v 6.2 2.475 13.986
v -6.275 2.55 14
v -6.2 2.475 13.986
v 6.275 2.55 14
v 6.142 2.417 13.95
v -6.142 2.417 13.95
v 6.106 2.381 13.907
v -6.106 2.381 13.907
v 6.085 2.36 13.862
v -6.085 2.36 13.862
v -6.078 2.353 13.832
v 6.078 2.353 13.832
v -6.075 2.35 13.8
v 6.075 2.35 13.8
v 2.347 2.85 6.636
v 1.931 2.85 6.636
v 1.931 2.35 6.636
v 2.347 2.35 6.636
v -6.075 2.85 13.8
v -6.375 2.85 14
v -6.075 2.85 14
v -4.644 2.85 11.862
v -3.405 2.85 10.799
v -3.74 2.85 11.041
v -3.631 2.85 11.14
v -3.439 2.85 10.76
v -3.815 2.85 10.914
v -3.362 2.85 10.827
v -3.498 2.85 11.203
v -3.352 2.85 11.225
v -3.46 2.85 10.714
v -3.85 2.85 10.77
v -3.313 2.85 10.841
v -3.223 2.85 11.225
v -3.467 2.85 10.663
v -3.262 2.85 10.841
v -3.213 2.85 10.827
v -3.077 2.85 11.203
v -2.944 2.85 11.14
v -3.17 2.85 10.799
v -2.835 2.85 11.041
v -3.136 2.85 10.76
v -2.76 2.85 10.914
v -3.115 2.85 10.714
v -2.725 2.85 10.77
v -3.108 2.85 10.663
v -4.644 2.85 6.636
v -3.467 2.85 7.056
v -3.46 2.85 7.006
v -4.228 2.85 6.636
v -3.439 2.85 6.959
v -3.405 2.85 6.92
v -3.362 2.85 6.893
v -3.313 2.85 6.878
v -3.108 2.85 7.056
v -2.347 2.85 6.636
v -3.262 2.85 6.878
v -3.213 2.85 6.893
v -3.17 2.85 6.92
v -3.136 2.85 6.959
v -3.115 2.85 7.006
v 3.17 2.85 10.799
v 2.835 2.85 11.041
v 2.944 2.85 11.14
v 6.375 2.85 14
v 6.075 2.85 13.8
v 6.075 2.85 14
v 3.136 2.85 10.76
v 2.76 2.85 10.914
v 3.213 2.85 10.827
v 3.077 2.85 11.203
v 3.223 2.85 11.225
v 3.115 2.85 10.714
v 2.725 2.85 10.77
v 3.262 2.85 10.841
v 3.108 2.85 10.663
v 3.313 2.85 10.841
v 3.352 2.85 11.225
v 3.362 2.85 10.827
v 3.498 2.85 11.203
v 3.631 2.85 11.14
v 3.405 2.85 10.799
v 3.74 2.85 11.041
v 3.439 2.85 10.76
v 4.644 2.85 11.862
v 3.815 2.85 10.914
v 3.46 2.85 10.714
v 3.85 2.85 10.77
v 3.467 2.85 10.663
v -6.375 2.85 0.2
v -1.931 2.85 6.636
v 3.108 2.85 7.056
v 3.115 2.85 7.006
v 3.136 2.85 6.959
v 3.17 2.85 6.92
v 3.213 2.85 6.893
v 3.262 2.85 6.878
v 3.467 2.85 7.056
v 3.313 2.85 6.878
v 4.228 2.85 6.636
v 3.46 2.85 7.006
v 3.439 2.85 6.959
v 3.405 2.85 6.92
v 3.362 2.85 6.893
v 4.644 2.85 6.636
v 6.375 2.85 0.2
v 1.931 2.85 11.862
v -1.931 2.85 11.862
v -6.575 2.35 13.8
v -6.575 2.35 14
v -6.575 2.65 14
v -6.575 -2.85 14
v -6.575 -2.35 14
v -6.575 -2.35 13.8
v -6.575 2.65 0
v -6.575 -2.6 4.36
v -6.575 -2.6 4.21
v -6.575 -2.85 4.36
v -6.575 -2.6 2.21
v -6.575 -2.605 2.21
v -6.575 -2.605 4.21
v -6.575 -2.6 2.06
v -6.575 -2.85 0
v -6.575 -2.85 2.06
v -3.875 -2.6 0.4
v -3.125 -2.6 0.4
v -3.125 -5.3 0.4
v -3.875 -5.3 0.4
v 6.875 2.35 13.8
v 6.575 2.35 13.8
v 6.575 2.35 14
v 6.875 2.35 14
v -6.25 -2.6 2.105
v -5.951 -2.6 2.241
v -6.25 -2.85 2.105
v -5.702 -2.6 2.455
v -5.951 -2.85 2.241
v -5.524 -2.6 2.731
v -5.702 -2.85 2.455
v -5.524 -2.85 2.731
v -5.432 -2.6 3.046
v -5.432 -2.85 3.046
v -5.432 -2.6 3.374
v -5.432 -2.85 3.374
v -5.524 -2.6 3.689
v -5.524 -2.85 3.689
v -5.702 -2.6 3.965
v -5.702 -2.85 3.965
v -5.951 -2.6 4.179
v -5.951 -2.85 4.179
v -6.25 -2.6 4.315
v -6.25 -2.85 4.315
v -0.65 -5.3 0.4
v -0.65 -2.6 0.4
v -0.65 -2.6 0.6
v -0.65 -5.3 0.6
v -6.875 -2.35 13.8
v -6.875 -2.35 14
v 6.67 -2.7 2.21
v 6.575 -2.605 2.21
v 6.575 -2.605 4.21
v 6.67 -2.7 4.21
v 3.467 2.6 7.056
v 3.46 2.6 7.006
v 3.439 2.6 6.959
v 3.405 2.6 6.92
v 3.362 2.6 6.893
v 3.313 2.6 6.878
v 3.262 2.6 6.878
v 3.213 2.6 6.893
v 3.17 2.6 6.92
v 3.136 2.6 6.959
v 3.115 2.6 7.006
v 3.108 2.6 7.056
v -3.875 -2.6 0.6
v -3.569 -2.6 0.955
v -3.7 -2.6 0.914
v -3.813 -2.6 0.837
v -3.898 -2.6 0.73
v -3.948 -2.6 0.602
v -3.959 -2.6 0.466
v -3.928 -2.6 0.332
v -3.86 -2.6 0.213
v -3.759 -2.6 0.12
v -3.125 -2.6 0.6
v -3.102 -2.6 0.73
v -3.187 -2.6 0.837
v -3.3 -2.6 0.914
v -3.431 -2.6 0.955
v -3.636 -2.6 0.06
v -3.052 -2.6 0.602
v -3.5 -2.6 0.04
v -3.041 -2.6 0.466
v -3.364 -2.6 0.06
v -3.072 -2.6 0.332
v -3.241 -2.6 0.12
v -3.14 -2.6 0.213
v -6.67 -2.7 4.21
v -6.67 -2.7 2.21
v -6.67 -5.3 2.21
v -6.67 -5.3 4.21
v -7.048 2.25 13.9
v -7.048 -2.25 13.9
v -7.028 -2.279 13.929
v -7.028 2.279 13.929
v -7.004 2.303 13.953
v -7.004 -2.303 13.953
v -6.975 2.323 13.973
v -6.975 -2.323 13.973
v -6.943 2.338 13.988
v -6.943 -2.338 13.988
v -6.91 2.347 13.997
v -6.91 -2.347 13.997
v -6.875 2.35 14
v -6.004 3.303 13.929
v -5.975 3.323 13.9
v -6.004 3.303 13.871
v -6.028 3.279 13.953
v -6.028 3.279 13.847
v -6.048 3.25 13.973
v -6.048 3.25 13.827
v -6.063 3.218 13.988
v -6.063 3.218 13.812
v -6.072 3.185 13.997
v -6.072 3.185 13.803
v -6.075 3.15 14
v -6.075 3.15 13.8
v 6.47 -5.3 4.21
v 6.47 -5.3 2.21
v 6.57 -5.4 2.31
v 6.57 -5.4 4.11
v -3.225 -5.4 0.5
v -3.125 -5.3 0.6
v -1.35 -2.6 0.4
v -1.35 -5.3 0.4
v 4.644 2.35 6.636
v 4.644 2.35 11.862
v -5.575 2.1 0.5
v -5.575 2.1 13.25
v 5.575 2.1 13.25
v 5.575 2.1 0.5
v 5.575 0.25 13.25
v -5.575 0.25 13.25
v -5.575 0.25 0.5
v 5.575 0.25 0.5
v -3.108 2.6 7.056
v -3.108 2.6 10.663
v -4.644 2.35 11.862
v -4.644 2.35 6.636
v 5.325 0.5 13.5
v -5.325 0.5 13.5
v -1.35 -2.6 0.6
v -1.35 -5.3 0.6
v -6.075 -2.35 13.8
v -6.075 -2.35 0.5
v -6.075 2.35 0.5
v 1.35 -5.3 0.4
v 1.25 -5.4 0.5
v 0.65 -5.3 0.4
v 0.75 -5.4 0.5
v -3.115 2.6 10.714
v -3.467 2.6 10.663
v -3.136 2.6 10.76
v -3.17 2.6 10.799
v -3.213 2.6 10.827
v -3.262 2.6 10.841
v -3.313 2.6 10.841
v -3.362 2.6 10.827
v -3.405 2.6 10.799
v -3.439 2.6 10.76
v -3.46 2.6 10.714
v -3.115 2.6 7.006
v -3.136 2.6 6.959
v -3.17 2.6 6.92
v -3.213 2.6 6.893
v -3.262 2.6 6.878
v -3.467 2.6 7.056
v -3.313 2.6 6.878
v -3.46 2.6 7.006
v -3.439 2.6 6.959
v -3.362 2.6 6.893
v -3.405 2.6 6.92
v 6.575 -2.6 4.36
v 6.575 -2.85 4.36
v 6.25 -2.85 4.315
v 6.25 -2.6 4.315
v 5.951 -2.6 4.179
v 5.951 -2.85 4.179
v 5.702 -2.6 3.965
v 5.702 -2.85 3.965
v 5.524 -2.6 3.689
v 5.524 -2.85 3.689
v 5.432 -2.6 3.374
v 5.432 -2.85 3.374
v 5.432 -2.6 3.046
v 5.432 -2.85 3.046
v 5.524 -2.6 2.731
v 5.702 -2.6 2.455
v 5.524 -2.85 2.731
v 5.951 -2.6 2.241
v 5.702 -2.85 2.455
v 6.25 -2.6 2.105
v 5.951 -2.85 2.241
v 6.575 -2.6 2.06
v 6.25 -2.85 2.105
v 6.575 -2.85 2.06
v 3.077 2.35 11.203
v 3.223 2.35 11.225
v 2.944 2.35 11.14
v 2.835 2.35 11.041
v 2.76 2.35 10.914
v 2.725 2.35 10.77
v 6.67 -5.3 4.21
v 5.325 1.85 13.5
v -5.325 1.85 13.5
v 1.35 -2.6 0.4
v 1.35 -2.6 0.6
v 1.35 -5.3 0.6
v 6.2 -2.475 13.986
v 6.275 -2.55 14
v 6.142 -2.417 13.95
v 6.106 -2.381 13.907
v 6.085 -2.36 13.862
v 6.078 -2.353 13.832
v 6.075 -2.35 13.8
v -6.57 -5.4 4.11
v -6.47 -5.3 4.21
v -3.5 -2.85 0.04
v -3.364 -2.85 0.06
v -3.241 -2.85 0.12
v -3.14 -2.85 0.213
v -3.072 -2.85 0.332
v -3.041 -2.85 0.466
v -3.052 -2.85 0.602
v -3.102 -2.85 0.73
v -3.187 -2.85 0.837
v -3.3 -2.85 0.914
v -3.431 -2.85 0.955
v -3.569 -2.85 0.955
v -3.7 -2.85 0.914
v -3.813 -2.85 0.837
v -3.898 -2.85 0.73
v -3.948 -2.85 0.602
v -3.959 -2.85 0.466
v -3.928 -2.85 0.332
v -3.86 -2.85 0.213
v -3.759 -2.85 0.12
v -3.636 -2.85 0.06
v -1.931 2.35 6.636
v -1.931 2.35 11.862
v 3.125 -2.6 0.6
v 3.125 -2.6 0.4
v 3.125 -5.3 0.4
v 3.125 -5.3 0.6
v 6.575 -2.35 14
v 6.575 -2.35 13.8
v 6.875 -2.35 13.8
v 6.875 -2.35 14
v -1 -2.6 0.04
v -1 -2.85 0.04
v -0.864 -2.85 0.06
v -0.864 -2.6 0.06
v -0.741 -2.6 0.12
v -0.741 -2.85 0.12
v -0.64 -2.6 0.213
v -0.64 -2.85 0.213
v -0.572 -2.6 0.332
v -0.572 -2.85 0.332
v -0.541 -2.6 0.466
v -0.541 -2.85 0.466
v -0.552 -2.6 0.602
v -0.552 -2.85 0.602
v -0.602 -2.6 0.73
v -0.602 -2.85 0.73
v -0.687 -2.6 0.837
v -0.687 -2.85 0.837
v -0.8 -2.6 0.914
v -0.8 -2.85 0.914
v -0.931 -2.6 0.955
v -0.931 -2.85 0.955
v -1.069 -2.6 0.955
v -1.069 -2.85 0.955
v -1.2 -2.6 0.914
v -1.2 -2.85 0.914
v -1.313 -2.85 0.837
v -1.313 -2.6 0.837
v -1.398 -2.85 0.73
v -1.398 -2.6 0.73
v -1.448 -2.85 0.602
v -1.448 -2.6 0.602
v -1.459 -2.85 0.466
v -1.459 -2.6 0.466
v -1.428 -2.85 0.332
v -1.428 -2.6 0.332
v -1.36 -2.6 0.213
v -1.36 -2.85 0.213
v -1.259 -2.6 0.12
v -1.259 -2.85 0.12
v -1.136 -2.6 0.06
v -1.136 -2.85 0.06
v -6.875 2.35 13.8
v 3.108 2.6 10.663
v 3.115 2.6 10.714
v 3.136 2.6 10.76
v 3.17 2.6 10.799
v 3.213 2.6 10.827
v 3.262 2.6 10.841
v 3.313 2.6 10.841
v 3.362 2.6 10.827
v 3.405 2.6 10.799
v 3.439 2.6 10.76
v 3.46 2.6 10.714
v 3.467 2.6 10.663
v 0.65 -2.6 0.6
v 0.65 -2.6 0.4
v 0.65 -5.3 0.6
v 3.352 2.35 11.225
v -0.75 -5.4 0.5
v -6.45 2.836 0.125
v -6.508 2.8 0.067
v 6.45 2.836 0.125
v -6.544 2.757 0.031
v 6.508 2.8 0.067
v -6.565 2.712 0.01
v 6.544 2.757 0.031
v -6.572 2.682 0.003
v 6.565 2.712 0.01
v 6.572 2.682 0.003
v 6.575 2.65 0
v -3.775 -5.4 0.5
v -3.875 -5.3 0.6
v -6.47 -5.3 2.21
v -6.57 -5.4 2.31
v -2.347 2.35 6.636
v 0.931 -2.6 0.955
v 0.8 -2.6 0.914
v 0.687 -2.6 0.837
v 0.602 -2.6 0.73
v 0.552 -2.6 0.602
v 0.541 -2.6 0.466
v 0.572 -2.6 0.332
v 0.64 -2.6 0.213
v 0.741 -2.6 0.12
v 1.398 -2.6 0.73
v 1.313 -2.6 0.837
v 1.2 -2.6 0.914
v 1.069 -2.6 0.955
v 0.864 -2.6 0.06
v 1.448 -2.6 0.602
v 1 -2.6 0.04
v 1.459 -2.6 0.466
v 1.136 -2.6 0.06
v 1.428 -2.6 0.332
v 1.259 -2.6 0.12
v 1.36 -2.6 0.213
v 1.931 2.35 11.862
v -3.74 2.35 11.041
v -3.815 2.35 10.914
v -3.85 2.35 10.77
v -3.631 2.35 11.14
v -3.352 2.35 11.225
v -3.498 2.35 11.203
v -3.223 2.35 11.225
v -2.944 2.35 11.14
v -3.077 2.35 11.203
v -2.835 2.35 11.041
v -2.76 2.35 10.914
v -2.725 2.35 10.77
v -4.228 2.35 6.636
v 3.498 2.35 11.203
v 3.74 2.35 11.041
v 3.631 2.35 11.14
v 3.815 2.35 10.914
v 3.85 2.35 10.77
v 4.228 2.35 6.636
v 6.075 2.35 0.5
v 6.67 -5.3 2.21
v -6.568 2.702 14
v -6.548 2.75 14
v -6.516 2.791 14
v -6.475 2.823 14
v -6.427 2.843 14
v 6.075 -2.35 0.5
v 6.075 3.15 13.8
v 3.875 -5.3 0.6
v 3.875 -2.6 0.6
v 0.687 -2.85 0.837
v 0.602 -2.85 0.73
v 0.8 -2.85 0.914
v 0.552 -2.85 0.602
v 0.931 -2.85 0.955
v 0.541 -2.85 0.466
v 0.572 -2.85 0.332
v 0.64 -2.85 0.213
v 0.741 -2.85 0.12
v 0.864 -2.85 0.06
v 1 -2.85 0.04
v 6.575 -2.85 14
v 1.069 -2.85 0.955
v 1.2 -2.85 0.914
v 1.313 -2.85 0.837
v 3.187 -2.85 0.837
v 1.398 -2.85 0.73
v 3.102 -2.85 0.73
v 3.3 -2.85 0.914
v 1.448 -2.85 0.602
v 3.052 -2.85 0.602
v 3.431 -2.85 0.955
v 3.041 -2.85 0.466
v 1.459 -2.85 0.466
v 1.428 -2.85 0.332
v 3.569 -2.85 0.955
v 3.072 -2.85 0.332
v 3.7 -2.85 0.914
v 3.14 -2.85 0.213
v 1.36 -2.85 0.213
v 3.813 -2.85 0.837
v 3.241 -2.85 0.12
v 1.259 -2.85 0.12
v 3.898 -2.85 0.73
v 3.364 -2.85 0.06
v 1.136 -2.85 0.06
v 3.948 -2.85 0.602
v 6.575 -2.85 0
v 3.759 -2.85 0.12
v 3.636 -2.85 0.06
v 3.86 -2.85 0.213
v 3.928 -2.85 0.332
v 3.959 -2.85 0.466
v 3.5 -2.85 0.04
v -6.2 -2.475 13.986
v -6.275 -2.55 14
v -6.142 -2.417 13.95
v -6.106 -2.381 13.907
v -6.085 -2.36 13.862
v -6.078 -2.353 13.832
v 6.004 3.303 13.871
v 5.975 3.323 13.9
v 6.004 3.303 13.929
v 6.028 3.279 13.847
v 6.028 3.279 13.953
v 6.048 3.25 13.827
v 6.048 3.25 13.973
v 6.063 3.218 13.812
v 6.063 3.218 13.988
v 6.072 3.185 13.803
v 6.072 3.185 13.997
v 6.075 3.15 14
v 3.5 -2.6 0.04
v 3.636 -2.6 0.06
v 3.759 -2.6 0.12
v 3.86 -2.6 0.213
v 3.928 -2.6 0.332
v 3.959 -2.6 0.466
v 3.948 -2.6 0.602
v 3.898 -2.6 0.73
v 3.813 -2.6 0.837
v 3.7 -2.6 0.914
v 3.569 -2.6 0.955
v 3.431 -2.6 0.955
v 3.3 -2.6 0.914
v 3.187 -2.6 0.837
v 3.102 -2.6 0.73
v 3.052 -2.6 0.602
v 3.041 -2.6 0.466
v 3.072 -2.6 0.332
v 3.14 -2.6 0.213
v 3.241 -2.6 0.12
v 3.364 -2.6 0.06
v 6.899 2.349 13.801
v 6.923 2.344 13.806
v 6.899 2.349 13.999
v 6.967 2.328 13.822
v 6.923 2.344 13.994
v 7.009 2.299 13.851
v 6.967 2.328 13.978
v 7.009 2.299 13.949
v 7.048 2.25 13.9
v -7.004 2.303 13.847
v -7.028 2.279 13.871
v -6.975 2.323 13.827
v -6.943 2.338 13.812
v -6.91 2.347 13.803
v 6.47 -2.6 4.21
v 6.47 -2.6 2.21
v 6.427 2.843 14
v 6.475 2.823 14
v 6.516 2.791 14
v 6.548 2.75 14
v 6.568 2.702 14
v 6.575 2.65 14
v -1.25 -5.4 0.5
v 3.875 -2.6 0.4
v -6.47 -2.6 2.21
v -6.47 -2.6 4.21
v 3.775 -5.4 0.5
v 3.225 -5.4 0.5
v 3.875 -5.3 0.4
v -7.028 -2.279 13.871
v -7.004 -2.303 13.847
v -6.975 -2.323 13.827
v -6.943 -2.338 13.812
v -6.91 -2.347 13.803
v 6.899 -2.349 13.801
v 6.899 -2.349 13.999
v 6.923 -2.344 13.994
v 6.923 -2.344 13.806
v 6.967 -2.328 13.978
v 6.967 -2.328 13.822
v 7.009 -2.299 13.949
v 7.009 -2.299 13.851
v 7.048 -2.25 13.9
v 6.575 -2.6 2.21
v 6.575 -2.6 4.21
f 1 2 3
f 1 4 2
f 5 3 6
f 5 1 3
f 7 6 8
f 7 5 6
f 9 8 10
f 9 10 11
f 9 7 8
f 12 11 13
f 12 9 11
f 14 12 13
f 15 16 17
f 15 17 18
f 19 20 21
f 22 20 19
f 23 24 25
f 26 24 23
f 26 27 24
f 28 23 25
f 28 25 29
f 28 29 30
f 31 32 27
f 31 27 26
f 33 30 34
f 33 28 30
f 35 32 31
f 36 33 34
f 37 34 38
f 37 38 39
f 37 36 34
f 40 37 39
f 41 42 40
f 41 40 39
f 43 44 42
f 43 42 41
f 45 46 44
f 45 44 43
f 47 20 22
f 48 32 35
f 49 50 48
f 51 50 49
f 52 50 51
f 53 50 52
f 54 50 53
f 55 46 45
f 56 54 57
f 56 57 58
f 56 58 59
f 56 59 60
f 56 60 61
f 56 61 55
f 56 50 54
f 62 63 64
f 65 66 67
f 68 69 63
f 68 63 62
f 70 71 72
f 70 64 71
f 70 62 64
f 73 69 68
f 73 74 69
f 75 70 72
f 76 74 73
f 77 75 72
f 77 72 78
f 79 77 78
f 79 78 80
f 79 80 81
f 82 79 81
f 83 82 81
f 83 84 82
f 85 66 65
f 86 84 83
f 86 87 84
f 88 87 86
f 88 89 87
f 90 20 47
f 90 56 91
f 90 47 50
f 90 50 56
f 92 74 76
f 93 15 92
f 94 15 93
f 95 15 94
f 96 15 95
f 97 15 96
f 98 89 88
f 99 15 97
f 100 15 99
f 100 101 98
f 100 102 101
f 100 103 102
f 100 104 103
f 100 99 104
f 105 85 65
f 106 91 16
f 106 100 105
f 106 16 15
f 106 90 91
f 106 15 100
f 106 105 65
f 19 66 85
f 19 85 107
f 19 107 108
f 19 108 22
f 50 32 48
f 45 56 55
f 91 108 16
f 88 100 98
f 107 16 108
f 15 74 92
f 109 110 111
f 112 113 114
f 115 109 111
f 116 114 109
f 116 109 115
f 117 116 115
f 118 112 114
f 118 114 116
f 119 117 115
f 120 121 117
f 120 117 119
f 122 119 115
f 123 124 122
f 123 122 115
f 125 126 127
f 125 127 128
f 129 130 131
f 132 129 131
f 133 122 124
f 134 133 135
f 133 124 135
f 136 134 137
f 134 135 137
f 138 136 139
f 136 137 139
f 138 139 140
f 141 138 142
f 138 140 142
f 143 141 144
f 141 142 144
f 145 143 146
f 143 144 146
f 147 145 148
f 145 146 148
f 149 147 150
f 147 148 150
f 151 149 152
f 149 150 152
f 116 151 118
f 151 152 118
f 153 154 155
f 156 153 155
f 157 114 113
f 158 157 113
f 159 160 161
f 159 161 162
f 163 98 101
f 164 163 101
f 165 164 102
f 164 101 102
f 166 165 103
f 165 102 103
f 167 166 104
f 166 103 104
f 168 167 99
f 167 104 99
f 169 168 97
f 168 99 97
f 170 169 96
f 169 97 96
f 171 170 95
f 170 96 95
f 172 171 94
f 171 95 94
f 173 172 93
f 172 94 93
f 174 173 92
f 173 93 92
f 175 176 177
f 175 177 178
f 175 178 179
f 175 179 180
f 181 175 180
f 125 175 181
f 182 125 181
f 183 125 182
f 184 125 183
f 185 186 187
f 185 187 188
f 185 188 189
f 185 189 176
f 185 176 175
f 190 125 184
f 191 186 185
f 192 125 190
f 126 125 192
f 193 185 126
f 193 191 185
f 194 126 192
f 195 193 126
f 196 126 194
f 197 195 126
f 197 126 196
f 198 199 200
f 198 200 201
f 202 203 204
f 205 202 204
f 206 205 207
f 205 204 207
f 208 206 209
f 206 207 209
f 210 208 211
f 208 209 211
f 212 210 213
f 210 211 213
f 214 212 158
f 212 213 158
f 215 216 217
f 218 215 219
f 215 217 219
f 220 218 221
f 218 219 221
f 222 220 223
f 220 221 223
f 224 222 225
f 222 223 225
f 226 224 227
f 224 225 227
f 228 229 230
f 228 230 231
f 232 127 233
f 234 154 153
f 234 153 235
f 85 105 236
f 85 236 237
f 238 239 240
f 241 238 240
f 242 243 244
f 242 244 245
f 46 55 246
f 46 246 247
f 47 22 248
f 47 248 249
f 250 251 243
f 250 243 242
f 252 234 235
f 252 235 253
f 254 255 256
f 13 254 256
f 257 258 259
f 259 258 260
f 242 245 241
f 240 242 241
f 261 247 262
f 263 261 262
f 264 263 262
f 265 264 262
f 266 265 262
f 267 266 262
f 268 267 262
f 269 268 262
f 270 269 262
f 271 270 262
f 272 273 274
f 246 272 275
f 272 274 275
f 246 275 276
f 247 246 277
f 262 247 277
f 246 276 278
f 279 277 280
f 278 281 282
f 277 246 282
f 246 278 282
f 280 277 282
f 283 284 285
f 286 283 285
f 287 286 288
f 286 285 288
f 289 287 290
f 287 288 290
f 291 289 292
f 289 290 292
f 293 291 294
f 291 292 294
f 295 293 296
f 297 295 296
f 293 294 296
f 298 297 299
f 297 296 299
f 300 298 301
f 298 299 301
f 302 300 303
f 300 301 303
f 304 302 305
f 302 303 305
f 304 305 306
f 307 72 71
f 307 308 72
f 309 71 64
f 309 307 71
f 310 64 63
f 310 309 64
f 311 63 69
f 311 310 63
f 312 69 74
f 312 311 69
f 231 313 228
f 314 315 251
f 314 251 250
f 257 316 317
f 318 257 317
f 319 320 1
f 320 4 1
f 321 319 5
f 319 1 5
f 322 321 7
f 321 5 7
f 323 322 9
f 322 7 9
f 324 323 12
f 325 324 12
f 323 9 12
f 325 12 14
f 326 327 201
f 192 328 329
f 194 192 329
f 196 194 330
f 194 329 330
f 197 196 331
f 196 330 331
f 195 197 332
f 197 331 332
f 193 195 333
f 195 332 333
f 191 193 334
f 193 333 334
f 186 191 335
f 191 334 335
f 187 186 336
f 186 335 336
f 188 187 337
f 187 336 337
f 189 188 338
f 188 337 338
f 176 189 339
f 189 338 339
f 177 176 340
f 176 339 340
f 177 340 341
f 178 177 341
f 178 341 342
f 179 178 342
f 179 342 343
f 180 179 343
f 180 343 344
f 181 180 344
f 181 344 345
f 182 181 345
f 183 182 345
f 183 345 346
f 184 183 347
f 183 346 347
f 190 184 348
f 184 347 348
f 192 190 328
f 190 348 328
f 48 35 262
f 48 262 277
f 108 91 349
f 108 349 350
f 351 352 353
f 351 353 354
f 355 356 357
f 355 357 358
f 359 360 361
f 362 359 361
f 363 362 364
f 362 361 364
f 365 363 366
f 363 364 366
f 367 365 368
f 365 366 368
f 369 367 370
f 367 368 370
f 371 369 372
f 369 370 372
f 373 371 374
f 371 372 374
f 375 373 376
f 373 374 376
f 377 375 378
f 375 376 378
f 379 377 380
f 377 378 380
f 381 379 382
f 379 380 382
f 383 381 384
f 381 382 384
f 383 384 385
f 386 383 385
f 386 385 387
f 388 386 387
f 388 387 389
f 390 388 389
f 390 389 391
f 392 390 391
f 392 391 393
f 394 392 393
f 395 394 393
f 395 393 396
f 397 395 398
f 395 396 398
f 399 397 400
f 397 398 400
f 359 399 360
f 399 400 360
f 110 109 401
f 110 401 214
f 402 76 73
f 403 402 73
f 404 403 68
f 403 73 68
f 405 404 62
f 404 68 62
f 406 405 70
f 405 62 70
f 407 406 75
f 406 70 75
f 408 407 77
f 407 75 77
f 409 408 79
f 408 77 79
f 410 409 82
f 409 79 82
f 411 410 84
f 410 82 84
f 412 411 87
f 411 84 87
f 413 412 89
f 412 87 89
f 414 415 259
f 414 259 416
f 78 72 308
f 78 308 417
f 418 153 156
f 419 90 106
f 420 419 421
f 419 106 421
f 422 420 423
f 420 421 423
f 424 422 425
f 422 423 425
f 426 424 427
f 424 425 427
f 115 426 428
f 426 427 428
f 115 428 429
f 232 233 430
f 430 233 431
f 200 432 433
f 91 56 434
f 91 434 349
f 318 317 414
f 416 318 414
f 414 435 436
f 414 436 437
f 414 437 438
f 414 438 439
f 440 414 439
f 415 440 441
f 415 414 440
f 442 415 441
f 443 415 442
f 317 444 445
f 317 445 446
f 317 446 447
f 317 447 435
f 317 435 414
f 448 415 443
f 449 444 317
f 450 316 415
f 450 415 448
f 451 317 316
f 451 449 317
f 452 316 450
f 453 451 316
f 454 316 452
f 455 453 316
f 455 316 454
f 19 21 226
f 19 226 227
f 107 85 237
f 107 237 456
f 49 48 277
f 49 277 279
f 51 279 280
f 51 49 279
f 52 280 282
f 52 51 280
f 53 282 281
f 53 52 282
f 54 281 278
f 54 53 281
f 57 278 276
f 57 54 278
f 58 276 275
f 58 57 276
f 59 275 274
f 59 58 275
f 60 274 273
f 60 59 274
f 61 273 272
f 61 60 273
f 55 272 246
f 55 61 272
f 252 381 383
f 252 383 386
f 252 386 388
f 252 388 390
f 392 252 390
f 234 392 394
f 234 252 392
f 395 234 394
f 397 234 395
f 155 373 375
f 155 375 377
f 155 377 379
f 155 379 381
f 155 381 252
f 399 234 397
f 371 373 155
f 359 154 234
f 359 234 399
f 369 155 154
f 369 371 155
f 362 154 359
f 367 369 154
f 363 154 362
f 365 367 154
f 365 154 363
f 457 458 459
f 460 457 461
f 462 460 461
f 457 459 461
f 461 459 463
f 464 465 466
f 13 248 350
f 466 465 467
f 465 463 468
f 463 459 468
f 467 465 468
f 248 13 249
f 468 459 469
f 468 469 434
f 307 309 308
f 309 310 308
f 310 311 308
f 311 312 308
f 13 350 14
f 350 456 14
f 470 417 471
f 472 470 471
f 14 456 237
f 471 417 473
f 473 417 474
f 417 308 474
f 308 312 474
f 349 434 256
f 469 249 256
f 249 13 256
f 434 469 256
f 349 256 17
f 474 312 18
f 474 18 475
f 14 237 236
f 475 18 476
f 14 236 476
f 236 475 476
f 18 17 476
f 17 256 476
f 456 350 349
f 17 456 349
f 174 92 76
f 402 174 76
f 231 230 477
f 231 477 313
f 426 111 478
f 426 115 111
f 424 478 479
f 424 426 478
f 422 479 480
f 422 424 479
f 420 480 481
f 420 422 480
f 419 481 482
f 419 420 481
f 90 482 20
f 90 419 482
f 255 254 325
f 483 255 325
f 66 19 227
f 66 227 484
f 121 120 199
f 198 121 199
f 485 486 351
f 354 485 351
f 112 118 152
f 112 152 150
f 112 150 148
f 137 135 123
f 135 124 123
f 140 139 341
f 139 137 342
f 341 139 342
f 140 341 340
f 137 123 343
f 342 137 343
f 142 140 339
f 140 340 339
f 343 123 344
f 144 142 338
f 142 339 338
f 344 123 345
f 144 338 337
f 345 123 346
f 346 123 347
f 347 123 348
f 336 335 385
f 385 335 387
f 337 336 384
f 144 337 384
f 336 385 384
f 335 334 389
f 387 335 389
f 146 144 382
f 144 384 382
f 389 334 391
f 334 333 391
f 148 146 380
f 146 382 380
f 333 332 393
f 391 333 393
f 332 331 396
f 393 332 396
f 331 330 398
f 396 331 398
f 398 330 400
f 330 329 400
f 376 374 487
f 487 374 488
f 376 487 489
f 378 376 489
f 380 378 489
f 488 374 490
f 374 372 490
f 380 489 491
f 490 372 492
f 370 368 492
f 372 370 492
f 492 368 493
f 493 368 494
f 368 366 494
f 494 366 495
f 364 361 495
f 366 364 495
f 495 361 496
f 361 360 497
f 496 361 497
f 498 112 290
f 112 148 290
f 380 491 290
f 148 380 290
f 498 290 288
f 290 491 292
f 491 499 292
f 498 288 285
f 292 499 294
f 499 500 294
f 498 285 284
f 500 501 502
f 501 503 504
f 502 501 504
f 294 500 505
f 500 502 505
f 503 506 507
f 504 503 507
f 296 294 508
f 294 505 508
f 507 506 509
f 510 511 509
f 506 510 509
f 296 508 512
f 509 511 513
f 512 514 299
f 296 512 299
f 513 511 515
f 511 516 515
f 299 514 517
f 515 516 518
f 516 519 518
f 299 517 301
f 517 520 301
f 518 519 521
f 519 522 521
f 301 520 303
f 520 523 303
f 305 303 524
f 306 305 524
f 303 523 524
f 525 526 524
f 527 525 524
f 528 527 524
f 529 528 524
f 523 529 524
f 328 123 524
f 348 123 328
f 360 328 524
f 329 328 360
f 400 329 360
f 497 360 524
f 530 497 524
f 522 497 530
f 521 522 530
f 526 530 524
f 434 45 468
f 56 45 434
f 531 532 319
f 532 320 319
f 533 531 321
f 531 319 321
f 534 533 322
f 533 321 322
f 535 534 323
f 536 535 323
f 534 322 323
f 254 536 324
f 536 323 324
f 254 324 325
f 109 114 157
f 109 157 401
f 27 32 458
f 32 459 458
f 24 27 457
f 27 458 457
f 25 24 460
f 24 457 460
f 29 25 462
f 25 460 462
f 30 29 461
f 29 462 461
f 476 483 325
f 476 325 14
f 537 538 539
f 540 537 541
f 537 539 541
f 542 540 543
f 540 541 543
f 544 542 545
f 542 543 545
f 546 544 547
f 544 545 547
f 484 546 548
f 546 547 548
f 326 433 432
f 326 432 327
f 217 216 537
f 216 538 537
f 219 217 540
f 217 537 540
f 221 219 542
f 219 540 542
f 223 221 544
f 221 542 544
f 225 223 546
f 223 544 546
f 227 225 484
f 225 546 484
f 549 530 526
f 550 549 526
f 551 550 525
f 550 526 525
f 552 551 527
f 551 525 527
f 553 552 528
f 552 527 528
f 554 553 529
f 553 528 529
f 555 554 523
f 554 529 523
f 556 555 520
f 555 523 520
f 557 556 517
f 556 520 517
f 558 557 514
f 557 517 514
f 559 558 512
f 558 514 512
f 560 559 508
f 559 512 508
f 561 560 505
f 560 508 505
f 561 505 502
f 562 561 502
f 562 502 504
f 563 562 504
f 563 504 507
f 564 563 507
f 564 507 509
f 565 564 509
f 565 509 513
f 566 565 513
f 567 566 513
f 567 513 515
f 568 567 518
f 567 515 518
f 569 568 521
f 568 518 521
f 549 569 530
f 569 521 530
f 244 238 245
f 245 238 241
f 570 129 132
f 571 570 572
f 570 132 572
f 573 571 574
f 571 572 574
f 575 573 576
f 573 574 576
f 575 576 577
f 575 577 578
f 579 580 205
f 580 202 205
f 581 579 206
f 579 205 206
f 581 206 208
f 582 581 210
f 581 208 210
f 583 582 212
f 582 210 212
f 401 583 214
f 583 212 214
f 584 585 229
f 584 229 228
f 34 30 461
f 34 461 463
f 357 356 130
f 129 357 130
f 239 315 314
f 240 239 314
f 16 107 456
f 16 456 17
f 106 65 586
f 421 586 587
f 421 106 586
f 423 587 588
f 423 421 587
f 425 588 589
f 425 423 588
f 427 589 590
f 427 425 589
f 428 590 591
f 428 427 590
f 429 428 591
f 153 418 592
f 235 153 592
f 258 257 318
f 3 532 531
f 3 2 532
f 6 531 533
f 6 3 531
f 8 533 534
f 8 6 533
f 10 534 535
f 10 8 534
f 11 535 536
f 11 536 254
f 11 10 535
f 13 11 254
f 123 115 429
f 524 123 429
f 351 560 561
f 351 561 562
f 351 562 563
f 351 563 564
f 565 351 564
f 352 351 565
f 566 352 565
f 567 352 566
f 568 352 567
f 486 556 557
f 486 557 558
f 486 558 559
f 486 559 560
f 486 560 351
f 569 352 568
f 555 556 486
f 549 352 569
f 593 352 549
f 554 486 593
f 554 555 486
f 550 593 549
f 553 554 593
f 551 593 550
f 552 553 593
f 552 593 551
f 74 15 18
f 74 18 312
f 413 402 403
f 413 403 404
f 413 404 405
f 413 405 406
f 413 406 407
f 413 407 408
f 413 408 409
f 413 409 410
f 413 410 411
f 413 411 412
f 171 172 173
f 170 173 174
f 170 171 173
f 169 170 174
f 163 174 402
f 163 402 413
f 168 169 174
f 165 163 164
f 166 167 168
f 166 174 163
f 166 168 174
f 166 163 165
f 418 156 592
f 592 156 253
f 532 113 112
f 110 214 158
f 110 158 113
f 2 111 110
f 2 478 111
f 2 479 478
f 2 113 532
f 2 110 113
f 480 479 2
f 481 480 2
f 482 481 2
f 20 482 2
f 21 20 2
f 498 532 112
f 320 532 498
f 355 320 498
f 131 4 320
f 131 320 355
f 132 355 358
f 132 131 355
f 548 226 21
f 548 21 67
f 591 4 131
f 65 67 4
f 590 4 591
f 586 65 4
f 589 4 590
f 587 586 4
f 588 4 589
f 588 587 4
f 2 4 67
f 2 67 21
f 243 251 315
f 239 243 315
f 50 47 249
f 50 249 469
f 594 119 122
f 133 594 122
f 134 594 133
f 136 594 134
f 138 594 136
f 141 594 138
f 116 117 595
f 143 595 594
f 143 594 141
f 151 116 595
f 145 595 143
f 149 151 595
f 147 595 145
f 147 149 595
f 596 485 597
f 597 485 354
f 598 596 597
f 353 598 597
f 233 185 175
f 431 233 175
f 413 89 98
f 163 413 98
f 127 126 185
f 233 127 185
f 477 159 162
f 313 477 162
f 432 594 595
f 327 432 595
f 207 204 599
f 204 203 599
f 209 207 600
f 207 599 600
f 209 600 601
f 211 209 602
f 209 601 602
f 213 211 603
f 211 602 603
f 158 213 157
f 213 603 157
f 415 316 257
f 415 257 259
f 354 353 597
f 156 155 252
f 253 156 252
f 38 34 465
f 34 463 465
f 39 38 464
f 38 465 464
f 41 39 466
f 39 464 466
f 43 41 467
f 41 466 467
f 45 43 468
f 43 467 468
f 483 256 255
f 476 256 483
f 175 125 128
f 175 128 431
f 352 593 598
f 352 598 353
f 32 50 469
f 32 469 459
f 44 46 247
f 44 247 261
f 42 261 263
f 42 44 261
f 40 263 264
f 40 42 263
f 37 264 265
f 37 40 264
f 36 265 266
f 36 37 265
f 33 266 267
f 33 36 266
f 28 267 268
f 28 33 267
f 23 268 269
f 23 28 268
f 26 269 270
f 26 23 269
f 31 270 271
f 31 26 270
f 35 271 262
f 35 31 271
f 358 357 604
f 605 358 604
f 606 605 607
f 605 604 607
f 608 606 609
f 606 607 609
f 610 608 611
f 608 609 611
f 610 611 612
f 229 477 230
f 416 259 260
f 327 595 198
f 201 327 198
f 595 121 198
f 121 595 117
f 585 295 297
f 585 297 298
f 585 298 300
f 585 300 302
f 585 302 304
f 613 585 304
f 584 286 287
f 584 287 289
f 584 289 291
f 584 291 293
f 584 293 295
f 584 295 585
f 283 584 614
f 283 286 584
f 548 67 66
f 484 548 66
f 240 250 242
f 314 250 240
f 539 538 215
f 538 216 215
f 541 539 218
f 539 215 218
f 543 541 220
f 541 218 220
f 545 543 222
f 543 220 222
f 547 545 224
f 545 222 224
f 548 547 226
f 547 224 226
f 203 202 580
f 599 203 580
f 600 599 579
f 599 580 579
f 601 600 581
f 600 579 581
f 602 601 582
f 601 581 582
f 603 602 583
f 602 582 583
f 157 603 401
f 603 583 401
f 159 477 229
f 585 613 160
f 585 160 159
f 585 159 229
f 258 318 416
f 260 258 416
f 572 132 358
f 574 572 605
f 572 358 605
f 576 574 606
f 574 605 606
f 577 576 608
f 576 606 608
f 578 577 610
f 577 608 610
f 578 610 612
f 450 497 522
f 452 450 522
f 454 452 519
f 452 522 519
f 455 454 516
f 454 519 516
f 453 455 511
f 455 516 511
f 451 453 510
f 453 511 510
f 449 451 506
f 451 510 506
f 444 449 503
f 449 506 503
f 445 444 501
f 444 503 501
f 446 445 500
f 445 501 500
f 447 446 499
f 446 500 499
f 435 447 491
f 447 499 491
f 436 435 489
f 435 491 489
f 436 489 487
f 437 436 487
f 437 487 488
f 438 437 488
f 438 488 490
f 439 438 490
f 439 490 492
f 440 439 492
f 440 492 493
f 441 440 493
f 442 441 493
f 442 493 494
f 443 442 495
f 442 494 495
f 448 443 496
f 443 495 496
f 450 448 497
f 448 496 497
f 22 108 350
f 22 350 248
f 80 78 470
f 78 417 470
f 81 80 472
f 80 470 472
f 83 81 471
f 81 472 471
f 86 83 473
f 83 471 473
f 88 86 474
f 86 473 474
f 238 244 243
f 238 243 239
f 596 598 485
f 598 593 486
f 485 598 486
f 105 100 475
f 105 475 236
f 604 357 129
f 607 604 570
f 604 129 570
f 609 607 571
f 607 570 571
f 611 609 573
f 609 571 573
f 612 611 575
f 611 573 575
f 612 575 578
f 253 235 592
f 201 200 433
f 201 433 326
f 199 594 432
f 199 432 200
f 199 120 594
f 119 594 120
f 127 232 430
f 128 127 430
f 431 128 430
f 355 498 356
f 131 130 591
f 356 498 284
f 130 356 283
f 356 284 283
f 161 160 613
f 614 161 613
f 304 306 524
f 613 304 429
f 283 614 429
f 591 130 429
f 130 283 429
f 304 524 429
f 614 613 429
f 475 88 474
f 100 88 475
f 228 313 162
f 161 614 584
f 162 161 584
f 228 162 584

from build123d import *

# Parameters (mm, degrees)
SKETCH_1_W             = 13.15
SKETCH_1_H             = 5.7
SKETCH_1_W_2           = 12.15
SKETCH_1_H_2           = 4.7
EXTRUDE_1_DEPTH        = 14
SKETCH_2_W             = 13.15
SKETCH_2_H             = 5.7
EXTRUDE_2_DEPTH        = 0.5
SKETCH_3_W             = 11.15
SKETCH_3_H             = 1.85
EXTRUDE_3_DEPTH        = 13
CHAMFER_1_SIZE         = 0.25
SKETCH_4_R             = 0.46
SKETCH_4_R_2           = 1.15
CUT_EXTRUDE_2_DEPTH    = 0.25
SKETCH_7_W             = 0.75
SKETCH_7_H             = 0.2
SKETCH_7_W_2           = 0.7
SKETCH_7_W_3           = 0.2
SKETCH_7_H_2           = 2
EXTRUDE_4_DEPTH        = 2.8
CHAMFER_3_SIZE         = 0.1
CHAMFER_4_SIZE         = 0.1
CUT_EXTRUDE_3_DEPTH    = 0.5
CUT_EXTRUDE_4_DEPTH    = 0.25
FILLET_1_R             = 0.5
SKETCH_11_W            = 0.2
SKETCH_11_H            = 4.7
EXTRUDE_5_DEPTH        = 0.5
FILLET_2_R             = 0.2
FILLET_2_OF_MIRROR_1_R = 0.2
SKETCH_12_W            = 12.15
SKETCH_12_H            = 0.2
EXTRUDE_6_DEPTH        = 0.5
FILLET_3_R             = 0.2
FILLET_4_R             = 0.2
FILLET_5_R             = 0.2


# Some blends are built 0.0001 mm under size
with BuildPart() as part:
    # 草图1 → 凸台-拉伸1 (new body)
    with BuildSketch(Plane.XY):
        Rectangle(SKETCH_1_W, SKETCH_1_H)
        Rectangle(SKETCH_1_W_2, SKETCH_1_H_2, mode=Mode.SUBTRACT)
    extrude(amount=EXTRUDE_1_DEPTH)

    # 草图2 → 凸台-拉伸2 (add)
    with BuildSketch(Plane.XY):
        Rectangle(SKETCH_2_W, SKETCH_2_H)
    extrude(amount=EXTRUDE_2_DEPTH)

    # 草图4 → 切除-拉伸2 (cut)
    with BuildSketch(Plane.XZ.offset(2.85)):
        with Locations(Location((-1, 0.5, 0), (0, 0, 270))):
            Circle(SKETCH_4_R)
        with Locations(Location((1, 0.5, 0), (0, 0, 270))):
            Circle(SKETCH_4_R)
        with Locations(Location((-3.5, 0.5, 0), (0, 0, 270))):
            Circle(SKETCH_4_R)
        with Locations(Location((3.5, 0.5, 0), (0, 0, 270))):
            Circle(SKETCH_4_R)
        with Locations((-6.57, 3.21)):
            Circle(SKETCH_4_R_2)
        with Locations((6.57, 3.21)):
            Circle(SKETCH_4_R_2)
    extrude(amount=-CUT_EXTRUDE_2_DEPTH, mode=Mode.SUBTRACT)

    # 草图7 → 凸台-拉伸4 (add)
    with BuildSketch(Plane(origin=(0, -2.6, -2.85), x_dir=(-1, 0, 0), z_dir=(0, 1, 0))):
        with Locations((-3.5, 3.35)):
            Rectangle(SKETCH_7_W, SKETCH_7_H)
        with Locations((-1, 3.35)):
            Rectangle(SKETCH_7_W_2, SKETCH_7_H)
        with Locations((3.5, 3.35)):
            Rectangle(SKETCH_7_W, SKETCH_7_H)
        with Locations((1, 3.35)):
            Rectangle(SKETCH_7_W_2, SKETCH_7_H)
        with Locations((6.57, 6.06)):
            Rectangle(SKETCH_7_W_3, SKETCH_7_H_2)
        with Locations((-6.57, 6.06)):
            Rectangle(SKETCH_7_W_3, SKETCH_7_H_2)
    extrude(amount=-EXTRUDE_4_DEPTH)

    # 倒角3
    # the kernel refuses this chamfer: 0.1 mm, written as the material it takes off along each edge
    with BuildSketch(Plane(origin=(6.67, -2.6, 1.952831701), x_dir=(-0.9996219169112966, 0.02749587661058742, 0), z_dir=(0, 0, 1))) as chamfer_3_piece_1_section:
        Polygon((CHAMFER_3_SIZE * 0.999621916911, CHAMFER_3_SIZE * 0.0274958766106), (-CHAMFER_3_SIZE * 0.0274958766106, CHAMFER_3_SIZE * 0.999621916911), (0, 0), align=None)
    chamfer_3_piece_1 = extrude(amount=2.514336598, mode=Mode.PRIVATE)
    chamfer_3_piece_1 = split(chamfer_3_piece_1, bisect_by=Plane(origin=(6.575, -2.63325446, 3.21), z_dir=(1, 0, 0)), keep=Keep.TOP, mode=Mode.PRIVATE)
    add(chamfer_3_piece_1, mode=Mode.SUBTRACT)
    with BuildSketch(Plane(origin=(-6.67, -2.6, 1.952831701), x_dir=(0.9996219169112966, 0.02749587661058742, 0), z_dir=(0, 0, 1))) as chamfer_3_piece_2_section:
        Polygon((CHAMFER_3_SIZE * 0.999621916911, -CHAMFER_3_SIZE * 0.0274958766106), (-CHAMFER_3_SIZE * 0.0274958766106, -CHAMFER_3_SIZE * 0.999621916911), (0, 0), align=None)
    chamfer_3_piece_2 = extrude(amount=2.514336598, mode=Mode.PRIVATE)
    chamfer_3_piece_2 = split(chamfer_3_piece_2, bisect_by=Plane(origin=(-6.575, -2.63325446, 3.21), z_dir=(-1, 0, 0)), keep=Keep.TOP, mode=Mode.PRIVATE)
    add(chamfer_3_piece_2, mode=Mode.SUBTRACT)

    # 倒角4
    chamfer_4_edges = [part.edges().sort_by_distance(p)[0] for p in [
        (-0.65, -5.4, 0.5),
        (-1, -5.4, 0.6),
        (-1.35, -5.4, 0.5),
        (-1, -5.4, 0.4),
        (3.5, -5.4, 0.6),
        (3.125, -5.4, 0.5),
        (3.5, -5.4, 0.4),
        (3.875, -5.4, 0.5),
        (1, -5.4, 0.6),
        (0.65, -5.4, 0.5),
        (1, -5.4, 0.4),
        (1.35, -5.4, 0.5),
        (-6.67, -5.4, 3.21),
        (-6.57, -5.4, 2.21),
        (-6.47, -5.4, 3.21),
        (-6.57, -5.4, 4.21),
        (6.67, -5.4, 3.21),
        (6.57, -5.4, 4.21),
        (6.47, -5.4, 3.21),
        (6.57, -5.4, 2.21),
        (-3.125, -5.4, 0.5),
        (-3.5, -5.4, 0.6),
        (-3.875, -5.4, 0.5),
        (-3.5, -5.4, 0.4),
    ]]
    chamfer(chamfer_4_edges, length=CHAMFER_4_SIZE - 0.0001)  # a hair under: the kernel refuses the full size

    # 草图8 → 切除-拉伸3 (cut)
    with BuildSketch(Plane(origin=(0, 2.85, 0), x_dir=(1, 0, 0), z_dir=(0, 1, 0))):
        Polygon((-3.808819217, -11.224979928), (-2.766180783, -11.224979928), (-2.346891912, -6.635867656), (-1.930541709, -6.635867656), (-1.930541709, -11.86178054), (-4.644458291, -11.86178054), (-4.644458291, -6.635867656), (-4.228108088, -6.635867656), align=None)
        Polygon((3.808819217, -11.224979928), (4.228108088, -6.635867656), (4.644458291, -6.635867656), (4.644458291, -11.86178054), (1.930541709, -11.86178054), (1.930541709, -6.635867656), (2.346891912, -6.635867656), (2.766180783, -11.224979928), align=None)
    extrude(amount=-CUT_EXTRUDE_3_DEPTH, mode=Mode.SUBTRACT)

    # 草图9 → 切除-拉伸4 (cut)
    with BuildSketch(Plane(origin=(0, 2.85, 0), x_dir=(1, 0, 0), z_dir=(0, 1, 0))):
        with BuildLine():
            Line((-3.467306843, -10.663035767), (-3.467306843, -7.056248419))
            ThreePointArc((-3.467306843, -7.056248419), (-3.2875, -6.876441576), (-3.107693157, -7.056248419))
            Line((-3.107693157, -7.056248419), (-3.107693157, -10.663035767))
            ThreePointArc((-3.107693157, -10.663035767), (-3.2875, -10.842842609), (-3.467306843, -10.663035767))
        make_face()
        with BuildLine():
            Line((3.467306843, -10.663035767), (3.467306843, -7.056248419))
            ThreePointArc((3.467306843, -7.056248419), (3.2875, -6.876441576), (3.107693157, -7.056248419))
            Line((3.107693157, -7.056248419), (3.107693157, -10.663035767))
            ThreePointArc((3.107693157, -10.663035767), (3.2875, -10.842842609), (3.467306843, -10.663035767))
        make_face()
    extrude(amount=-CUT_EXTRUDE_4_DEPTH, mode=Mode.SUBTRACT)

    # 圆角1
    fillet_1_edges = [part.edges().sort_by_distance(p)[0] for p in [
        (-3.808819217, 2.6, 11.224979928),
        (-2.766180783, 2.6, 11.224979928),
        (2.766180783, 2.6, 11.224979928),
        (3.808819217, 2.6, 11.224979928),
    ]]
    fillet(fillet_1_edges, radius=FILLET_1_R)

    # 草图11 → 凸台-拉伸5 (add)
    with BuildSketch(Plane.ZY.offset(6.575)):
        with Locations((13.9, 0)):
            Rectangle(SKETCH_11_W, SKETCH_11_H)
    extrude_5 = extrude(amount=EXTRUDE_5_DEPTH)

    # 圆角2
    # the kernel refuses this fillet: 0.2 mm, written as the material it takes off along each edge
    with BuildSketch(Plane(origin=(-7.075, -2.85, 14), x_dir=(1, 0, 0), z_dir=(0, 1, 0)), Plane(origin=(-7.075, 2.85, 13.8), x_dir=(1, 0, 0), z_dir=(0, -1, 0))) as fillet_2_piece_1:
        with BuildLine():
            CenterArc((FILLET_2_R, FILLET_2_R), FILLET_2_R, 180, 90)
            Line((0, FILLET_2_R), (0, 0))
            Line((0, 0), (FILLET_2_R, 0))
        make_face()
    extrude(amount=5.7, mode=Mode.SUBTRACT)
    with BuildSketch(Plane(origin=(-7.075, 2.35, 14.5), x_dir=(1, 0, 0), z_dir=(0, 0, -1)), Plane(origin=(-7.075, -2.35, 13.3), x_dir=(1, 0, 0), z_dir=(0, 0, 1))) as fillet_2_piece_2:
        with BuildLine():
            CenterArc((FILLET_2_R, FILLET_2_R), FILLET_2_R, 180, 90)
            Line((0, FILLET_2_R), (0, 0))
            Line((0, 0), (FILLET_2_R, 0))
        make_face()
    extrude(amount=1.2, mode=Mode.SUBTRACT)

    # 镜向1: 凸台-拉伸5 across plane
    add(extrude_5.mirror(Plane(origin=(0, 0, 0), x_dir=(0, 0, 1), z_dir=(1, 0, 0))))

    # 圆角2 of 镜向1
    # the kernel refuses this fillet: 0.2 mm, written as the material it takes off along each edge
    with BuildSketch(Plane(origin=(7.075, -2.85, 14), x_dir=(-1, 0, 0), z_dir=(0, 1, 0)), Plane(origin=(7.075, 2.85, 13.8), x_dir=(-1, 0, 0), z_dir=(0, -1, 0))) as fillet_2_of_mirror_1_piece_1:
        with BuildLine():
            CenterArc((FILLET_2_OF_MIRROR_1_R, -FILLET_2_OF_MIRROR_1_R), FILLET_2_OF_MIRROR_1_R, 90, 90)
            Line((0, -FILLET_2_OF_MIRROR_1_R), (0, 0))
            Line((0, 0), (FILLET_2_OF_MIRROR_1_R, 0))
        make_face()
    extrude(amount=5.7, mode=Mode.SUBTRACT)
    with BuildSketch(Plane(origin=(7.075, 2.35, 14.5), x_dir=(-1, 0, 0), z_dir=(0, 0, -1)), Plane(origin=(7.075, -2.35, 13.3), x_dir=(-1, 0, 0), z_dir=(0, 0, 1))) as fillet_2_of_mirror_1_piece_2:
        with BuildLine():
            CenterArc((FILLET_2_OF_MIRROR_1_R, -FILLET_2_OF_MIRROR_1_R), FILLET_2_OF_MIRROR_1_R, 90, 90)
            Line((0, -FILLET_2_OF_MIRROR_1_R), (0, 0))
            Line((0, 0), (FILLET_2_OF_MIRROR_1_R, 0))
        make_face()
    extrude(amount=1.2, mode=Mode.SUBTRACT)

    # 草图12 → 凸台-拉伸6 (add)
    with BuildSketch(Plane(origin=(0, 2.85, 0), x_dir=(1, 0, 0), z_dir=(0, 1, 0))):
        with Locations((0, -13.9)):
            Rectangle(SKETCH_12_W, SKETCH_12_H)
    extrude(amount=EXTRUDE_6_DEPTH)

    # 圆角3
    # the kernel refuses this fillet: 0.2 mm, written as the material it takes off along each edge
    with BuildSketch(Plane(origin=(-6.075, 3.35, 13.3), x_dir=(0, -1, 0), z_dir=(0, 0, 1)), Plane(origin=(6.075, 3.35, 14.5), x_dir=(0, -1, 0), z_dir=(0, 0, -1))) as fillet_3_piece_1:
        with BuildLine():
            CenterArc((FILLET_3_R, FILLET_3_R), FILLET_3_R, 180, 90)
            Line((0, FILLET_3_R), (0, 0))
            Line((0, 0), (FILLET_3_R, 0))
        make_face()
    extrude(amount=1.2, mode=Mode.SUBTRACT)
    with BuildSketch(Plane(origin=(-6.575, 3.35, 14), x_dir=(0, -1, 0), z_dir=(1, 0, 0)), Plane(origin=(6.575, 3.35, 13.8), x_dir=(0, -1, 0), z_dir=(-1, 0, 0))) as fillet_3_piece_2:
        with BuildLine():
            CenterArc((FILLET_3_R, FILLET_3_R), FILLET_3_R, 180, 90)
            Line((0, FILLET_3_R), (0, 0))
            Line((0, 0), (FILLET_3_R, 0))
        make_face()
    extrude(amount=13.15, mode=Mode.SUBTRACT)

    # 圆角4
    fillet_4_edges = [part.edges().sort_by_distance(p)[0] for p in [
        (6.075, 0, 14),
        (0, 2.35, 14),
        (-6.075, 0, 14),
        (0, -2.35, 14),
    ]]
    fillet(fillet_4_edges, radius=FILLET_4_R)

    # 圆角5
    fillet_5_edges = [part.edges().sort_by_distance(p)[0] for p in [
        (0, 2.85, 0),
        (-6.575, 2.85, 7),
        (6.575, 2.85, 7),
    ]]
    fillet(fillet_5_edges, radius=FILLET_5_R)


with BuildPart() as body_2:
    # 草图3 → 凸台-拉伸3 (new body)
    with BuildSketch(Plane.XY.offset(0.5)):
        with Locations((0, 1.175)):
            Rectangle(SKETCH_3_W, SKETCH_3_H)
    extrude(amount=EXTRUDE_3_DEPTH)

    # 倒角1
    chamfer_1_edges = [body_2.edges().sort_by_distance(p)[0] for p in [
        (5.575, 1.175, 13.5),
        (0, 2.1, 13.5),
        (-5.575, 1.175, 13.5),
        (0, 0.25, 13.5),
    ]]
    chamfer(chamfer_1_edges, length=CHAMFER_1_SIZE)


solid = Compound([part.part, body_2.part])
